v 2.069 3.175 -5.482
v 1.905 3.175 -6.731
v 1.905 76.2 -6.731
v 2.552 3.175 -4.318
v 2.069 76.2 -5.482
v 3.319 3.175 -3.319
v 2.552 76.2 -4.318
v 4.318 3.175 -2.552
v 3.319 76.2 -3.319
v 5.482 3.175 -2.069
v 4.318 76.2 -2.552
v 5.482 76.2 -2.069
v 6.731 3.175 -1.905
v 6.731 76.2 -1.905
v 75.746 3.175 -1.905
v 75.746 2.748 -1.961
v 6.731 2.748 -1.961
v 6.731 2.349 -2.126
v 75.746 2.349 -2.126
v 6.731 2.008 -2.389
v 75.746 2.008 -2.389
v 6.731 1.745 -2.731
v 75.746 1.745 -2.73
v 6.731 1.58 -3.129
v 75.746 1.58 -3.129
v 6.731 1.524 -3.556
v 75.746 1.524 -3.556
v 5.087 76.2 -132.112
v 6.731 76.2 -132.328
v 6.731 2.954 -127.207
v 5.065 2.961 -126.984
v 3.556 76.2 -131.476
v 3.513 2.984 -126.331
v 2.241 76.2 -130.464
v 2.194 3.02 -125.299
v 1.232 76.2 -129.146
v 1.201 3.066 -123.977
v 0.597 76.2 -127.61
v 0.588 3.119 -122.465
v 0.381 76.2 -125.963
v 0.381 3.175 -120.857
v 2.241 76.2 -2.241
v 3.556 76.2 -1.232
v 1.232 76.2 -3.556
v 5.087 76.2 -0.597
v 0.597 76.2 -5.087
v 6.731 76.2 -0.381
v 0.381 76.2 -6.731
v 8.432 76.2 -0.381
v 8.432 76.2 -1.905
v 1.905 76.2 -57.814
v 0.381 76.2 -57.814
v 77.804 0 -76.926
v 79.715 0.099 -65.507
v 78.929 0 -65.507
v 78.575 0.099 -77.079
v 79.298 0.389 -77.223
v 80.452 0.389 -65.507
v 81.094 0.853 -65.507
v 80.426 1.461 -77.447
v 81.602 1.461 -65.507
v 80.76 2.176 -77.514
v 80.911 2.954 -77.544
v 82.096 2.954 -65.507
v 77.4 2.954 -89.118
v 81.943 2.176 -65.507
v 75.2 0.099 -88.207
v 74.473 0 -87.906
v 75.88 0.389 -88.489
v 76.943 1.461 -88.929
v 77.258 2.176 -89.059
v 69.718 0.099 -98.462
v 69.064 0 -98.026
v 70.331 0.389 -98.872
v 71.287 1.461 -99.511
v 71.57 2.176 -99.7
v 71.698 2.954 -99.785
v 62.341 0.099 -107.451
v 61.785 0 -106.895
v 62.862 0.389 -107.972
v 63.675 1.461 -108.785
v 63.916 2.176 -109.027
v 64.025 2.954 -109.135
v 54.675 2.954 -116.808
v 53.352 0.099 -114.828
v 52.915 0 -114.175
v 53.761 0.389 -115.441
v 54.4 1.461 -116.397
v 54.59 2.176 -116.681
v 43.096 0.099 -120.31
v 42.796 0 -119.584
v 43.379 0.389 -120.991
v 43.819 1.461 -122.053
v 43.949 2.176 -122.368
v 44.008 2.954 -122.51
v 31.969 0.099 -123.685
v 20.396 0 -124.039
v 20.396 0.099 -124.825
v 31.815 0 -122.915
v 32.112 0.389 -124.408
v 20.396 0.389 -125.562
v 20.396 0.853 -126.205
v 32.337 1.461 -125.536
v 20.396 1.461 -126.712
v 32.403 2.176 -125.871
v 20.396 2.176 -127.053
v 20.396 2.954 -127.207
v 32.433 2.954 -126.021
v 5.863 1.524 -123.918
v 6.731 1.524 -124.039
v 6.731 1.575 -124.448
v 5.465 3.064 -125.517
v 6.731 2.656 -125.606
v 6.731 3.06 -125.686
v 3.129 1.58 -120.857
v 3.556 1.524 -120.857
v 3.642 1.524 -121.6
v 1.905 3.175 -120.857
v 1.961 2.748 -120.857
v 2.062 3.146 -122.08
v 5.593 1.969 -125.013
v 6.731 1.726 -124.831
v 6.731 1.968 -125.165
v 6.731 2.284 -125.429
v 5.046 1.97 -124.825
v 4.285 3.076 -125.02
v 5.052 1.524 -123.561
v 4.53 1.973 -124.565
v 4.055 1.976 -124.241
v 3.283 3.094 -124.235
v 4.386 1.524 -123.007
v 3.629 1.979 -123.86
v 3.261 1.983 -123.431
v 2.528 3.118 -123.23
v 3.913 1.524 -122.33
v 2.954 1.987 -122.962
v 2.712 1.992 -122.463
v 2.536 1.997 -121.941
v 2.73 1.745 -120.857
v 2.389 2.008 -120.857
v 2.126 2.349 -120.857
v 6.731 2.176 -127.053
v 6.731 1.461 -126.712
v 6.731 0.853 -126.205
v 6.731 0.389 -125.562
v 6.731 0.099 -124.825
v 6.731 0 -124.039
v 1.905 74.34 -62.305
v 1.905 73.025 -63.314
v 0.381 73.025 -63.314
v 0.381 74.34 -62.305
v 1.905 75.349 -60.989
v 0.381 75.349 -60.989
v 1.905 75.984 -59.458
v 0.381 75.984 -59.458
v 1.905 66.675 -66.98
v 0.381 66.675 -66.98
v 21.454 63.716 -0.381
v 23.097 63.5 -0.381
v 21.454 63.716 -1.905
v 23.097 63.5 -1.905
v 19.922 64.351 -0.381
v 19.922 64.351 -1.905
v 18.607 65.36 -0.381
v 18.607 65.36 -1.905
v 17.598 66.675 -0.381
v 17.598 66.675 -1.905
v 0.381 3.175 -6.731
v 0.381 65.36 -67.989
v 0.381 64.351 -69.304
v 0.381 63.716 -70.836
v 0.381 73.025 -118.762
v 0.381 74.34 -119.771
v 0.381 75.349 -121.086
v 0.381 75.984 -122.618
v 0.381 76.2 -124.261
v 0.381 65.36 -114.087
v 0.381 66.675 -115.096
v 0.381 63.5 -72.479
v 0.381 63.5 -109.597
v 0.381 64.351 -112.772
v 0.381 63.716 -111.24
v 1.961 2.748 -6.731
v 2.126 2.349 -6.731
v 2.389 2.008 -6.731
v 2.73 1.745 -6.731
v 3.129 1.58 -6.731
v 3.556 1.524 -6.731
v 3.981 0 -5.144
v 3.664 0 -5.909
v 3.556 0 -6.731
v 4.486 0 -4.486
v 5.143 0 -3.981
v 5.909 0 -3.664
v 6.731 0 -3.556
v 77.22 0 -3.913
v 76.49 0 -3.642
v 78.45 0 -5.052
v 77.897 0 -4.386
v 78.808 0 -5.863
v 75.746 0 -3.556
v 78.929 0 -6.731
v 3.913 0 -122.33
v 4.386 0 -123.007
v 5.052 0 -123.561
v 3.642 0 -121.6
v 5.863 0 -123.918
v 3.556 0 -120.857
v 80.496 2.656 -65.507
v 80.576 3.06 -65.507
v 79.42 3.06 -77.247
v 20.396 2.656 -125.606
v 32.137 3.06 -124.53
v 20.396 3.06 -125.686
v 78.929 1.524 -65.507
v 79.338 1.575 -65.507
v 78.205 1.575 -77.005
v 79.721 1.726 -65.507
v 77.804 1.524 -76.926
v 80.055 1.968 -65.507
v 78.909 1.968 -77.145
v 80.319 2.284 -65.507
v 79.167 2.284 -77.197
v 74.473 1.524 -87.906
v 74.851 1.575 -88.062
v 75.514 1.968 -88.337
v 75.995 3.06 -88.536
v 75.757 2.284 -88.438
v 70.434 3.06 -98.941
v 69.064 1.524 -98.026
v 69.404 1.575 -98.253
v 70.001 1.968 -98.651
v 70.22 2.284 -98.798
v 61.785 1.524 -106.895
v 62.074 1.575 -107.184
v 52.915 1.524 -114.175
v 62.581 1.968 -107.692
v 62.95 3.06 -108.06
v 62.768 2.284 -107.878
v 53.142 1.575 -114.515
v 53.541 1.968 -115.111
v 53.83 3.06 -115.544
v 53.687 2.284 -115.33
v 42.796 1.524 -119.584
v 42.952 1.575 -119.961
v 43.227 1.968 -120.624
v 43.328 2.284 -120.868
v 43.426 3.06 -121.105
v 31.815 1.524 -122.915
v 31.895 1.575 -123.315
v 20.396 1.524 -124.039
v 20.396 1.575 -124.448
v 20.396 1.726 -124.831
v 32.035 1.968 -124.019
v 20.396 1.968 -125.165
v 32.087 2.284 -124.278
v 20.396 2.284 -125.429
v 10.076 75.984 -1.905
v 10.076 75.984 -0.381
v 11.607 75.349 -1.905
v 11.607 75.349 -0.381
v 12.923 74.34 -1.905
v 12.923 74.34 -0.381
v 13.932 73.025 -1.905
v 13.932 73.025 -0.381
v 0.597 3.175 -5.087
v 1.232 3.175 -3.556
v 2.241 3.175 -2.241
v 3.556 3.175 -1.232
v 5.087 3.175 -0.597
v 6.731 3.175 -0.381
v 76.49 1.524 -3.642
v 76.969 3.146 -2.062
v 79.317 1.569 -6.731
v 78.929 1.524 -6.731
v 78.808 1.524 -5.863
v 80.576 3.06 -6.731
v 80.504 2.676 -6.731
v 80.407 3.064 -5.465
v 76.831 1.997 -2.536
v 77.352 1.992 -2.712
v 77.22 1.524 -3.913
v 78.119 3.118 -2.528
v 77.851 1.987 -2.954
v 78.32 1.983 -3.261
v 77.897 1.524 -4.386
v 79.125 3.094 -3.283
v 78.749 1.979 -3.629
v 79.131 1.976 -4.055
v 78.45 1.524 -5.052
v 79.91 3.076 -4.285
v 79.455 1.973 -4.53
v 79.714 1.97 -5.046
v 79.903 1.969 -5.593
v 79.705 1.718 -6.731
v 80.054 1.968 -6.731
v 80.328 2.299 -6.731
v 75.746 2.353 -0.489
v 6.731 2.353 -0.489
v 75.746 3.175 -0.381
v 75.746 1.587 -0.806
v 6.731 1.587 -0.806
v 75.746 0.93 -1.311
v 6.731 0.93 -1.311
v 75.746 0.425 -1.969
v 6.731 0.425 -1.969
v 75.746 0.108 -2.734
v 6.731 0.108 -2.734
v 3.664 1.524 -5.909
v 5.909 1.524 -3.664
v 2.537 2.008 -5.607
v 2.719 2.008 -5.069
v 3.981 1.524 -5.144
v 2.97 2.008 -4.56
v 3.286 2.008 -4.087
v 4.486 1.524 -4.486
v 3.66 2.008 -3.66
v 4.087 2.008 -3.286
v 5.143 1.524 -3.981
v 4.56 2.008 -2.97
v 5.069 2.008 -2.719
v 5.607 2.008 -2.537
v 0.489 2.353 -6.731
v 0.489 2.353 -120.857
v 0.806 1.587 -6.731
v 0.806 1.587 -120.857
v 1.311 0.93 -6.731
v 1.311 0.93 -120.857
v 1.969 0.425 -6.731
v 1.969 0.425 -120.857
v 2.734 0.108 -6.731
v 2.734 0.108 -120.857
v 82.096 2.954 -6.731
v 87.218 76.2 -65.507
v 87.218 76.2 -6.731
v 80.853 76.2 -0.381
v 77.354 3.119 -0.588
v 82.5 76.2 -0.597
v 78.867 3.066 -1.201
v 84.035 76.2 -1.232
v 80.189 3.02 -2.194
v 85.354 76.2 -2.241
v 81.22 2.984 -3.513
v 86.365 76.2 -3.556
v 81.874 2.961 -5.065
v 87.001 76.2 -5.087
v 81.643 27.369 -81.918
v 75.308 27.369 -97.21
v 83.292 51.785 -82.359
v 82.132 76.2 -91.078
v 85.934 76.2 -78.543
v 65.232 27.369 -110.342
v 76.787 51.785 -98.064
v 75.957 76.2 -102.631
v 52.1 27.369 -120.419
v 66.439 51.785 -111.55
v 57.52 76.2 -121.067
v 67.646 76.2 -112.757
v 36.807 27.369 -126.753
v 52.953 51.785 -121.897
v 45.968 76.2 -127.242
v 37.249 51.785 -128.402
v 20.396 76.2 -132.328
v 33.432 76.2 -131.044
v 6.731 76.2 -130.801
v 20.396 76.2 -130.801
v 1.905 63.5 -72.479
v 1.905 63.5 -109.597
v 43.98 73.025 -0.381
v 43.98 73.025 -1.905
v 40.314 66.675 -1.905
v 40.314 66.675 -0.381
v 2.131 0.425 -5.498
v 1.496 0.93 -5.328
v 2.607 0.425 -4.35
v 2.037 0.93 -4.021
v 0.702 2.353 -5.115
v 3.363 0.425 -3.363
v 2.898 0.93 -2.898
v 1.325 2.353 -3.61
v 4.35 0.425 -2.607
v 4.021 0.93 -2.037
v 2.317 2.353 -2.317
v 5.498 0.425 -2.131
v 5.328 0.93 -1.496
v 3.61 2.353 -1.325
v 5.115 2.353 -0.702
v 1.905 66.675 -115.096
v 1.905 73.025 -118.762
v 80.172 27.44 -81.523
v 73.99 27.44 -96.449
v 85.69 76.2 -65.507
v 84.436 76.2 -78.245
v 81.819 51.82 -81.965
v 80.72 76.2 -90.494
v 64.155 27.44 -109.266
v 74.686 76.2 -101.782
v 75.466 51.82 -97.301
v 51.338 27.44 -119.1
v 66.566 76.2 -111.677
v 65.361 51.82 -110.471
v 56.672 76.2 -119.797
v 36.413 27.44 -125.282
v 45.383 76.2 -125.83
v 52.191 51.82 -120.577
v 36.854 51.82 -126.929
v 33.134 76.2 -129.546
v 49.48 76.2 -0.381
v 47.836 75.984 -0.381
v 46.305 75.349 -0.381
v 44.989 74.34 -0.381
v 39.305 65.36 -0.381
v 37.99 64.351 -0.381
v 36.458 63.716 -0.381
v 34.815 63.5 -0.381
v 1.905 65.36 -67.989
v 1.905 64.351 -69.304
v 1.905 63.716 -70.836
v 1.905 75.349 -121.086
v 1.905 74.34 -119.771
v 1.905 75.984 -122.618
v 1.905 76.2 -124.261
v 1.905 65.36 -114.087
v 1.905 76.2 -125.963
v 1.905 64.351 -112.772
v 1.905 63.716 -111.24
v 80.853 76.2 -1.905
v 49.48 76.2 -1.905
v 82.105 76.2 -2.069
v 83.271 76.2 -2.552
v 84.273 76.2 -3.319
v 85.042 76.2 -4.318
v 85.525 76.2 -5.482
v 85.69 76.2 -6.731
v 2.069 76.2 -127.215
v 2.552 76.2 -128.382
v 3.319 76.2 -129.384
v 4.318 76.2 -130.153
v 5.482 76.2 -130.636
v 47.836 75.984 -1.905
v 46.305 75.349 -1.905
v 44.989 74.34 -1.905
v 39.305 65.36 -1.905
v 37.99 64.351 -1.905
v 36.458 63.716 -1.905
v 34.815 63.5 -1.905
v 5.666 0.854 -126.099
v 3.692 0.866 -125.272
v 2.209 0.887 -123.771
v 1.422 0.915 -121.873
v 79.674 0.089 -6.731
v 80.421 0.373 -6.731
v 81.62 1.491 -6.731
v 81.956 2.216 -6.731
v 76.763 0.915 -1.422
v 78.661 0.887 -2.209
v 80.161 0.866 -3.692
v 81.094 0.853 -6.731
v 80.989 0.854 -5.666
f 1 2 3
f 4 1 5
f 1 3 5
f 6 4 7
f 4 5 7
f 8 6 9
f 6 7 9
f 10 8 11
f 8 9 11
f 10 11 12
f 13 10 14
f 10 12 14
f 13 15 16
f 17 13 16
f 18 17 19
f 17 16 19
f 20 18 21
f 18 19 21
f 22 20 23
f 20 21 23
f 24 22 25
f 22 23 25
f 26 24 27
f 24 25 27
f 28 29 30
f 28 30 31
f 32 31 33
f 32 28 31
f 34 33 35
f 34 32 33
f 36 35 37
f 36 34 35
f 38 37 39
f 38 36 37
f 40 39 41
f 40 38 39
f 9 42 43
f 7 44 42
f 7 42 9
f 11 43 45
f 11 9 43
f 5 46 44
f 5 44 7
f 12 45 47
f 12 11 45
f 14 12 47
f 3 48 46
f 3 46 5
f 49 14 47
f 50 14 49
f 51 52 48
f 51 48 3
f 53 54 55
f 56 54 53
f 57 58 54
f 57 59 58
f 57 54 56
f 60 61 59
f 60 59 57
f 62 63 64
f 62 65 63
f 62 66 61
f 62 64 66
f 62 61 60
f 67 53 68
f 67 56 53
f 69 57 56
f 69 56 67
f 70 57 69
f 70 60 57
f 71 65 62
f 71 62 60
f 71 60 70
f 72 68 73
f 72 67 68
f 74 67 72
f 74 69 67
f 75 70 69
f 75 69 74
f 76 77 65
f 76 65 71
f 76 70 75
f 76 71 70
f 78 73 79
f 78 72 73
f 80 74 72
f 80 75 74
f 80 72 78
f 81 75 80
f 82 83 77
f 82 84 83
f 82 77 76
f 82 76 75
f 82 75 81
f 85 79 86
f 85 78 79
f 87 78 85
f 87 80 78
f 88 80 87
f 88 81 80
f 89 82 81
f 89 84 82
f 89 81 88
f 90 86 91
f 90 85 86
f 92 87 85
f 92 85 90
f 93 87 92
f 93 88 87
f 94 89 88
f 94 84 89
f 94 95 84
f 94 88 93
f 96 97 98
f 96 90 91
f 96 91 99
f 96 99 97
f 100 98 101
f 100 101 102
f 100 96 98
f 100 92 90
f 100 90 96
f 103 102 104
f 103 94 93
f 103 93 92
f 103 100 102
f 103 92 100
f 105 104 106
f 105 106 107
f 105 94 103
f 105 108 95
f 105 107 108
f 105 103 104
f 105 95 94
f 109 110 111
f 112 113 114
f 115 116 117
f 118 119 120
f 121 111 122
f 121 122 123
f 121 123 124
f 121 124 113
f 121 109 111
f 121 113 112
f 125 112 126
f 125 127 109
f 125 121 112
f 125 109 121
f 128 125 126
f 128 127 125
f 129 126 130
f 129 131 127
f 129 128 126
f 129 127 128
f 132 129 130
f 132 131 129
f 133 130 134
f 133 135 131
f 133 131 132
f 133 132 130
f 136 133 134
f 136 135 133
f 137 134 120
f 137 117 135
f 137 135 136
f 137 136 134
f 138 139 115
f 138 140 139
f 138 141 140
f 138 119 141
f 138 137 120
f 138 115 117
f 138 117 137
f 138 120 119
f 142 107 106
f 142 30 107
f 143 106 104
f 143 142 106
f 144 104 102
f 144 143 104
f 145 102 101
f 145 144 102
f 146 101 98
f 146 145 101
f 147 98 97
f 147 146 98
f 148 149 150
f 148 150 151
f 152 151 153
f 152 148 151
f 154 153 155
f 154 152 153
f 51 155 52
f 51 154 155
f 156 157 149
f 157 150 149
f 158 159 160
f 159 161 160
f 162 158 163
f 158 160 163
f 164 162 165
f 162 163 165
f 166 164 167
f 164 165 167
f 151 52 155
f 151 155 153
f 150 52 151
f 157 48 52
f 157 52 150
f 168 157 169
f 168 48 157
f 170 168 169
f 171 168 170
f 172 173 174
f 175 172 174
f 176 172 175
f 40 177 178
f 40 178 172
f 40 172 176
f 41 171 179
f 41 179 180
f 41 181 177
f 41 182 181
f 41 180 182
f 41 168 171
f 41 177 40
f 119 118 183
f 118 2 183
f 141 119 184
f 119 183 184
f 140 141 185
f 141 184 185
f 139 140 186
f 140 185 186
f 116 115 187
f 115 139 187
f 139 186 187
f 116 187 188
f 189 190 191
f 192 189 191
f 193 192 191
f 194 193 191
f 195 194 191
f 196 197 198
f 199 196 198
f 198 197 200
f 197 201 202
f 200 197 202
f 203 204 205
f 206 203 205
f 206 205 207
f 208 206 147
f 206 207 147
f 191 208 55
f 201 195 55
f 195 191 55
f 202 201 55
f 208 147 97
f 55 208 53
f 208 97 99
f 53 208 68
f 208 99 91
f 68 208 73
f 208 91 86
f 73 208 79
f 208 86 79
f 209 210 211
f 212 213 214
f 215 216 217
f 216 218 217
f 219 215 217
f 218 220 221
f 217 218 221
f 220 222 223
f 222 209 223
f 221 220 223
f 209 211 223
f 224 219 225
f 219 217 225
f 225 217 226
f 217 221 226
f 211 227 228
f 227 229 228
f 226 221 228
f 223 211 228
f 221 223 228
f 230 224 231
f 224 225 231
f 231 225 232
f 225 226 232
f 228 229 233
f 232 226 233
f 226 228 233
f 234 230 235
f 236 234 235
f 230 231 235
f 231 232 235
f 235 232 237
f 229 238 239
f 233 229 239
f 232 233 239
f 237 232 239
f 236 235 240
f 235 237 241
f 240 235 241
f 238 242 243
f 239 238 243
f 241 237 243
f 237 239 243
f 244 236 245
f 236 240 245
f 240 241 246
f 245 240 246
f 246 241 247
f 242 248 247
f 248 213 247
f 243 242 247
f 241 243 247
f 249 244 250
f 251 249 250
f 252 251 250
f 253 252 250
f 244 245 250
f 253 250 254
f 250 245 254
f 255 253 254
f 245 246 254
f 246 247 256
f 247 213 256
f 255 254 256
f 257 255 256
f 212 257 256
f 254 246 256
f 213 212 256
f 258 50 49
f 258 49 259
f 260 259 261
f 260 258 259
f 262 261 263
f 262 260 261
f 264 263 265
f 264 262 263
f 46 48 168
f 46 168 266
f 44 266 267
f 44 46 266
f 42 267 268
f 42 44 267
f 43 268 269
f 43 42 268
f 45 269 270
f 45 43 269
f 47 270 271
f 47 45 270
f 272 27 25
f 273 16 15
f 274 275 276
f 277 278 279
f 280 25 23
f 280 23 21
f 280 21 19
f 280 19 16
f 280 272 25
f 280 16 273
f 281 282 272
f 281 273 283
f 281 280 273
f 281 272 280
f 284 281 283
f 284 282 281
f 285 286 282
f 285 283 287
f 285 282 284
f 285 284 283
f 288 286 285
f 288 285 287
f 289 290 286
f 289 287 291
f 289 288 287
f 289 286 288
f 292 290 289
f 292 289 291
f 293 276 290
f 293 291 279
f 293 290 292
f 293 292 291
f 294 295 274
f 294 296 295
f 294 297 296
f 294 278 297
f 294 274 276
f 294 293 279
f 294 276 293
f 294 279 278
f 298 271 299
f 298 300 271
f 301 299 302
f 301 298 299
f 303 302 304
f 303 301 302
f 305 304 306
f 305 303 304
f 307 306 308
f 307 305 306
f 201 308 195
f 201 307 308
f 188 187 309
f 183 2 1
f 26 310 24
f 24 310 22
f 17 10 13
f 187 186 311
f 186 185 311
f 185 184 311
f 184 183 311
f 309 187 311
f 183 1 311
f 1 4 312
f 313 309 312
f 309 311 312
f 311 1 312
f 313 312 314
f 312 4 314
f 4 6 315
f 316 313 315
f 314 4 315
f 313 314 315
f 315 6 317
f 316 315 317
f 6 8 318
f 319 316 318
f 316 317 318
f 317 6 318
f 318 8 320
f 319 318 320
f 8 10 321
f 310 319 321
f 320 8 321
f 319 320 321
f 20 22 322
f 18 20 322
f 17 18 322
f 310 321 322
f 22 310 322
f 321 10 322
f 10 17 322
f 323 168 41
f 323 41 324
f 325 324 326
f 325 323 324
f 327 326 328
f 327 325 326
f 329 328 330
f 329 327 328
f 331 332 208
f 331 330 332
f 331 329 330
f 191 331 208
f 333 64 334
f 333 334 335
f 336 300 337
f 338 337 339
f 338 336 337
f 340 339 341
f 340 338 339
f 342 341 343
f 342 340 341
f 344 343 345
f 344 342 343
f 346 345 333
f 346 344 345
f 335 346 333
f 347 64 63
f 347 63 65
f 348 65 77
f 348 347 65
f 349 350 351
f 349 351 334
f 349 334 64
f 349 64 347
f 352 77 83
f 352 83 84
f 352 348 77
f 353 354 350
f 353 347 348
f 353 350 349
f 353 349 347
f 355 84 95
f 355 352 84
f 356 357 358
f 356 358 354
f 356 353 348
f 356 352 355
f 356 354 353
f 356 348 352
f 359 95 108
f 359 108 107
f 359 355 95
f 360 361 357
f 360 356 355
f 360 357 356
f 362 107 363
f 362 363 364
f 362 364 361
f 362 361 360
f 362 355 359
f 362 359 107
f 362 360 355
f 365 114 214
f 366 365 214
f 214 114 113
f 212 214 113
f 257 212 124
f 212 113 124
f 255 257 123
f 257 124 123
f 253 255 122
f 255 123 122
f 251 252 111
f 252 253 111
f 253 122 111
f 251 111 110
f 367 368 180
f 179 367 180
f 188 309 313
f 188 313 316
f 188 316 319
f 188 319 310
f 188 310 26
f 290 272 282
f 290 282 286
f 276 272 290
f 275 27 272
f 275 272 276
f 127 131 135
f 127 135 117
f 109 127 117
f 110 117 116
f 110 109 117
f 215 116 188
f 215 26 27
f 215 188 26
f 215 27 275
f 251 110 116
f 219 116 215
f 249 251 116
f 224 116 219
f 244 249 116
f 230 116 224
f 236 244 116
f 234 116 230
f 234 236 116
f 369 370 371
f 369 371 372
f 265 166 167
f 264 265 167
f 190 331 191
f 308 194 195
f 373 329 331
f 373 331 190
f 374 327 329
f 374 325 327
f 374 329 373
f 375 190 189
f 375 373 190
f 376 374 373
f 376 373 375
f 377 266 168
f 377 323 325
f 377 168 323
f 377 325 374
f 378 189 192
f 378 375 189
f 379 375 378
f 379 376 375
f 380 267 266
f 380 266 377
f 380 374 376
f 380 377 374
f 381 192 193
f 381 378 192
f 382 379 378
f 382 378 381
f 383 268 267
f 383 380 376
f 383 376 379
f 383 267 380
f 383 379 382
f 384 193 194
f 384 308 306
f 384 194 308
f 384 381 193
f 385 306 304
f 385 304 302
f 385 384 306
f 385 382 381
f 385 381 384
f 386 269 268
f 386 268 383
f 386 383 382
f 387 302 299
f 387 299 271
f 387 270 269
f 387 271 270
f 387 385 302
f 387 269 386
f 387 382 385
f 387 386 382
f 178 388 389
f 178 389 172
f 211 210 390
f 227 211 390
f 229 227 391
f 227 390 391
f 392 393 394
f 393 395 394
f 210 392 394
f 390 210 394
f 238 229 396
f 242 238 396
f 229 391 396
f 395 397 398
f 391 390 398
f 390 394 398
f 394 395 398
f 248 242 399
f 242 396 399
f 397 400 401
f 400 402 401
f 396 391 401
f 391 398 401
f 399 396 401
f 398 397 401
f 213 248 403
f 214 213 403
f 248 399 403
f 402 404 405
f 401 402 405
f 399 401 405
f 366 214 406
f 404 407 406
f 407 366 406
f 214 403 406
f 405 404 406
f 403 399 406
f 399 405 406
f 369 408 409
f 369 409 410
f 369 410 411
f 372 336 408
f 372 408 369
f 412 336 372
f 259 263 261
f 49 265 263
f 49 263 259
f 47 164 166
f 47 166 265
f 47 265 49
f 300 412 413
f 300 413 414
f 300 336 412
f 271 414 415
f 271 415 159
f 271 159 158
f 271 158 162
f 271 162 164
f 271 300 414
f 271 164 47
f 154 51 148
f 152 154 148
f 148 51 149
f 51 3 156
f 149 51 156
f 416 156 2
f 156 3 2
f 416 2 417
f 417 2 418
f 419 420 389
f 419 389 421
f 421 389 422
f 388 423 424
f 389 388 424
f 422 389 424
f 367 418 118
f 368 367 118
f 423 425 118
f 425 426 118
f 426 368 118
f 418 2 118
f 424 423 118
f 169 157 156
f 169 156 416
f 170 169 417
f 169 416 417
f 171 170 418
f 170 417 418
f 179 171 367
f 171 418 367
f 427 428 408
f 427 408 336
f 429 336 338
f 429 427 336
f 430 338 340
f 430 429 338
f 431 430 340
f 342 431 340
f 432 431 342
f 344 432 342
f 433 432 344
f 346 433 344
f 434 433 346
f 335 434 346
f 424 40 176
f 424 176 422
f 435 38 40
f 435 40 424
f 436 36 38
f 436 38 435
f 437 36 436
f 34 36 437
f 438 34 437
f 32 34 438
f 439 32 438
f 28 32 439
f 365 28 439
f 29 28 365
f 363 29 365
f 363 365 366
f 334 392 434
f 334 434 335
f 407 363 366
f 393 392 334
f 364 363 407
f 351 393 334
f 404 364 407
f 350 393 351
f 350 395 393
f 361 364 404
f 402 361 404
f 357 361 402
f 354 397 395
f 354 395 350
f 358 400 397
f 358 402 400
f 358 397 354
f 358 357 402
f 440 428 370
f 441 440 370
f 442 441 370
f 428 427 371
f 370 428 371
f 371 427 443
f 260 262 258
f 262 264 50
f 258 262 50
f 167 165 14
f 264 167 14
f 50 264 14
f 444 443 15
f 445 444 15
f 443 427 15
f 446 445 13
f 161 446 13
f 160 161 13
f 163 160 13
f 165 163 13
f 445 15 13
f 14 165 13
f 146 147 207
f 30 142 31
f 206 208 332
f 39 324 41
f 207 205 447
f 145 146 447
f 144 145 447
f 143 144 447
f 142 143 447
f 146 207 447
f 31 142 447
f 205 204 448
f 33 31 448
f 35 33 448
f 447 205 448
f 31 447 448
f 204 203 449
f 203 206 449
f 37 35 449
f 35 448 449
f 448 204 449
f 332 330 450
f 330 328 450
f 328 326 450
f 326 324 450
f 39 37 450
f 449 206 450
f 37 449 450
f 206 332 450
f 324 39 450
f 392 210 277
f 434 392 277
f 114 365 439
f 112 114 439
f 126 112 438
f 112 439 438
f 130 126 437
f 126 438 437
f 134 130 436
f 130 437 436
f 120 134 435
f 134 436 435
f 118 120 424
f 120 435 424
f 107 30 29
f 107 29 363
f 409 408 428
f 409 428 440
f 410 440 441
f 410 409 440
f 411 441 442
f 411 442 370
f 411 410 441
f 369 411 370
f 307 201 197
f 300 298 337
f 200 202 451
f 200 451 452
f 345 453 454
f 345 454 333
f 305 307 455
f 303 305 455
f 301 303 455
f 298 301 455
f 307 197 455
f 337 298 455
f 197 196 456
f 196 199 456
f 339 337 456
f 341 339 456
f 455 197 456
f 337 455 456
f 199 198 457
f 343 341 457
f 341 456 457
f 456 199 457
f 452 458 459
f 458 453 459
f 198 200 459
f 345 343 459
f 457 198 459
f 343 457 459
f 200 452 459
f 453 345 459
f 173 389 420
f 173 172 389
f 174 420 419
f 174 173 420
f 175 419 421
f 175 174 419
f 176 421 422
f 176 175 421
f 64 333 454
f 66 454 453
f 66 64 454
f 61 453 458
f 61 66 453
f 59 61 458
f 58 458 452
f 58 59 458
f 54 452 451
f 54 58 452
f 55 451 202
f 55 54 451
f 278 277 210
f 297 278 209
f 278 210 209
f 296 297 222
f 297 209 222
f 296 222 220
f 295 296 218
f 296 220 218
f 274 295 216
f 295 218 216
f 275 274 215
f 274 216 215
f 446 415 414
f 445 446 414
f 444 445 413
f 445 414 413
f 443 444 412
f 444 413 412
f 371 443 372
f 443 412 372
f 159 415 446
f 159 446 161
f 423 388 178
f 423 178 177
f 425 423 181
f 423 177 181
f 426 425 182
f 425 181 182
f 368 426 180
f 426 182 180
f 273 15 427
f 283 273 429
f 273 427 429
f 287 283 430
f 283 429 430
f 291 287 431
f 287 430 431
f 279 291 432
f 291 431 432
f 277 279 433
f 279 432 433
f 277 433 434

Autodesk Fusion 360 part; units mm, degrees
sketch "Sketch1" plane through (0, 0, 0) normal (0, 1, 0) x (1, 0, 0)
  line L0 (0, 0) -> (-82.2706, 0)
  line L1 (-82.2706, 0) -> (-82.2706, 65.5066)
  line L2 (-20.3962, 127.381) -> (0, 127.381)
  line L3 (0, 127.381) -> (0, 0)
  arc A0 (-20.3962, 127.381) -> (-82.2706, 65.5066) centre (-20.3962, 65.5066) ccw
  line L4 (-81.8896, 0.381) -> (-81.8896, 65.5066)
  arc A1 (-20.3962, 127) -> (-81.8896, 65.5066) centre (-20.3962, 65.5066) ccw
  line L5 (-20.3962, 127) -> (-0.381, 127)
  line L6 (-0.381, 127) -> (-0.381, 0.381)
  line L7 (-0.381, 0.381) -> (-81.8896, 0.381)
  dimension "d1" = 82.2706
  dimension "d2" = 127.381
  dimension "d3" = 61.8744
  dimension "d27" = -0.381
extrude "Extrude1" add sketch "Sketch1" along normal blind 76.2 contours L4 A1 L5 L6 L7 makes body 1
draft "Draft1" angle -4 neutral plane through (0, 0, 0) pull (0, 1, 0) 3 faces at (-81.8896, 25.4, -22.0895) (-81.8199, 50.8, -68.4326) (-13.7245, 25.4, -127) on bodies 1
fillet "Fillet1" radius 6.35 3 edges at (-0.381, 38.1, -129.6642) (-0.381, 38.1, -0.381) (-84.5538, 38.1, -0.381) on bodies 1
fillet "Fillet2" radius 3.175 8 edges at (-0.381, 0, -63.6827) (-2.2409, 0, -125.1356) (-13.5636, 0, -127) (-63.8786, 0, -108.989) (-81.8896, 0, -36.1188) (-80.0252, 0, -2.2409) (-41.1275, 0, -0.381) (-2.2409, 0, -2.2409) on bodies 1
shell "Shell1" thickness 1.524 removed faces 1 at (-28.4244, 76.2, -72.3421) on bodies 1
mirror "Mirror1" about plane through (0, 0, 0) normal (1, 0, 0) of bodies 1 makes body 2
delete_body "RemoveBody1" bodies 1
sketch "Sketch2" plane through (0, 76.2, 0) normal (0, 1, 0) x (-1, 0, 0)
  line L0 (-19.431, -1.905) -> (-38.481, -1.905)
  line L1 (-38.481, -1.905) -> (-38.481, -0.381)
  line L2 (-38.481, -0.381) -> (-19.431, -0.381)
  line L3 (-19.431, -0.381) -> (-19.431, -1.905)
  line L4 (-0.381, -68.8129) -> (-1.905, -68.8129)
  line L5 (-1.905, -68.8129) -> (-1.905, -113.2629)
  line L6 (-1.905, -113.2629) -> (-0.381, -113.2629)
  line L7 (-0.381, -113.2629) -> (-0.381, -68.8129)
  line L8 (-0.381, -6.731) -> (-0.381, -125.9629)
  line L9 (-1.905, -125.9629) -> (-1.905, -6.731)
  line L10 (-6.731, -1.905) -> (-80.8525, -1.905)
  line L11 (-80.8525, -0.381) -> (-6.731, -0.381)
  dimension "d17" = 19.05
  dimension "d18" = 44.45
  dimension "d32" = 12.7
  dimension "d33" = 12.7
extrude "Extrude2" cut sketch "Sketch2" against normal blind 12.7 bodies 2
draft "Draft2" angle 30 neutral plane through (0, 63.5, 0) pull (0, 1, 0) 4 faces at (38.481, 67.7333, -1.397) (1.397, 67.7333, -113.2629) (0.889, 67.7333, -68.8129) (19.431, 67.7333, -0.889) on bodies 2
fillet "Fillet3" radius 6.35 8 edges at (1.143, 76.2, -120.5953) (1.143, 63.5, -113.2629) (1.143, 76.2, -61.4806) (1.143, 63.5, -68.8129) (12.0987, 76.2, -1.143) (19.431, 63.5, -1.143) (38.481, 63.5, -1.143) (45.8133, 76.2, -1.143) on bodies 2
